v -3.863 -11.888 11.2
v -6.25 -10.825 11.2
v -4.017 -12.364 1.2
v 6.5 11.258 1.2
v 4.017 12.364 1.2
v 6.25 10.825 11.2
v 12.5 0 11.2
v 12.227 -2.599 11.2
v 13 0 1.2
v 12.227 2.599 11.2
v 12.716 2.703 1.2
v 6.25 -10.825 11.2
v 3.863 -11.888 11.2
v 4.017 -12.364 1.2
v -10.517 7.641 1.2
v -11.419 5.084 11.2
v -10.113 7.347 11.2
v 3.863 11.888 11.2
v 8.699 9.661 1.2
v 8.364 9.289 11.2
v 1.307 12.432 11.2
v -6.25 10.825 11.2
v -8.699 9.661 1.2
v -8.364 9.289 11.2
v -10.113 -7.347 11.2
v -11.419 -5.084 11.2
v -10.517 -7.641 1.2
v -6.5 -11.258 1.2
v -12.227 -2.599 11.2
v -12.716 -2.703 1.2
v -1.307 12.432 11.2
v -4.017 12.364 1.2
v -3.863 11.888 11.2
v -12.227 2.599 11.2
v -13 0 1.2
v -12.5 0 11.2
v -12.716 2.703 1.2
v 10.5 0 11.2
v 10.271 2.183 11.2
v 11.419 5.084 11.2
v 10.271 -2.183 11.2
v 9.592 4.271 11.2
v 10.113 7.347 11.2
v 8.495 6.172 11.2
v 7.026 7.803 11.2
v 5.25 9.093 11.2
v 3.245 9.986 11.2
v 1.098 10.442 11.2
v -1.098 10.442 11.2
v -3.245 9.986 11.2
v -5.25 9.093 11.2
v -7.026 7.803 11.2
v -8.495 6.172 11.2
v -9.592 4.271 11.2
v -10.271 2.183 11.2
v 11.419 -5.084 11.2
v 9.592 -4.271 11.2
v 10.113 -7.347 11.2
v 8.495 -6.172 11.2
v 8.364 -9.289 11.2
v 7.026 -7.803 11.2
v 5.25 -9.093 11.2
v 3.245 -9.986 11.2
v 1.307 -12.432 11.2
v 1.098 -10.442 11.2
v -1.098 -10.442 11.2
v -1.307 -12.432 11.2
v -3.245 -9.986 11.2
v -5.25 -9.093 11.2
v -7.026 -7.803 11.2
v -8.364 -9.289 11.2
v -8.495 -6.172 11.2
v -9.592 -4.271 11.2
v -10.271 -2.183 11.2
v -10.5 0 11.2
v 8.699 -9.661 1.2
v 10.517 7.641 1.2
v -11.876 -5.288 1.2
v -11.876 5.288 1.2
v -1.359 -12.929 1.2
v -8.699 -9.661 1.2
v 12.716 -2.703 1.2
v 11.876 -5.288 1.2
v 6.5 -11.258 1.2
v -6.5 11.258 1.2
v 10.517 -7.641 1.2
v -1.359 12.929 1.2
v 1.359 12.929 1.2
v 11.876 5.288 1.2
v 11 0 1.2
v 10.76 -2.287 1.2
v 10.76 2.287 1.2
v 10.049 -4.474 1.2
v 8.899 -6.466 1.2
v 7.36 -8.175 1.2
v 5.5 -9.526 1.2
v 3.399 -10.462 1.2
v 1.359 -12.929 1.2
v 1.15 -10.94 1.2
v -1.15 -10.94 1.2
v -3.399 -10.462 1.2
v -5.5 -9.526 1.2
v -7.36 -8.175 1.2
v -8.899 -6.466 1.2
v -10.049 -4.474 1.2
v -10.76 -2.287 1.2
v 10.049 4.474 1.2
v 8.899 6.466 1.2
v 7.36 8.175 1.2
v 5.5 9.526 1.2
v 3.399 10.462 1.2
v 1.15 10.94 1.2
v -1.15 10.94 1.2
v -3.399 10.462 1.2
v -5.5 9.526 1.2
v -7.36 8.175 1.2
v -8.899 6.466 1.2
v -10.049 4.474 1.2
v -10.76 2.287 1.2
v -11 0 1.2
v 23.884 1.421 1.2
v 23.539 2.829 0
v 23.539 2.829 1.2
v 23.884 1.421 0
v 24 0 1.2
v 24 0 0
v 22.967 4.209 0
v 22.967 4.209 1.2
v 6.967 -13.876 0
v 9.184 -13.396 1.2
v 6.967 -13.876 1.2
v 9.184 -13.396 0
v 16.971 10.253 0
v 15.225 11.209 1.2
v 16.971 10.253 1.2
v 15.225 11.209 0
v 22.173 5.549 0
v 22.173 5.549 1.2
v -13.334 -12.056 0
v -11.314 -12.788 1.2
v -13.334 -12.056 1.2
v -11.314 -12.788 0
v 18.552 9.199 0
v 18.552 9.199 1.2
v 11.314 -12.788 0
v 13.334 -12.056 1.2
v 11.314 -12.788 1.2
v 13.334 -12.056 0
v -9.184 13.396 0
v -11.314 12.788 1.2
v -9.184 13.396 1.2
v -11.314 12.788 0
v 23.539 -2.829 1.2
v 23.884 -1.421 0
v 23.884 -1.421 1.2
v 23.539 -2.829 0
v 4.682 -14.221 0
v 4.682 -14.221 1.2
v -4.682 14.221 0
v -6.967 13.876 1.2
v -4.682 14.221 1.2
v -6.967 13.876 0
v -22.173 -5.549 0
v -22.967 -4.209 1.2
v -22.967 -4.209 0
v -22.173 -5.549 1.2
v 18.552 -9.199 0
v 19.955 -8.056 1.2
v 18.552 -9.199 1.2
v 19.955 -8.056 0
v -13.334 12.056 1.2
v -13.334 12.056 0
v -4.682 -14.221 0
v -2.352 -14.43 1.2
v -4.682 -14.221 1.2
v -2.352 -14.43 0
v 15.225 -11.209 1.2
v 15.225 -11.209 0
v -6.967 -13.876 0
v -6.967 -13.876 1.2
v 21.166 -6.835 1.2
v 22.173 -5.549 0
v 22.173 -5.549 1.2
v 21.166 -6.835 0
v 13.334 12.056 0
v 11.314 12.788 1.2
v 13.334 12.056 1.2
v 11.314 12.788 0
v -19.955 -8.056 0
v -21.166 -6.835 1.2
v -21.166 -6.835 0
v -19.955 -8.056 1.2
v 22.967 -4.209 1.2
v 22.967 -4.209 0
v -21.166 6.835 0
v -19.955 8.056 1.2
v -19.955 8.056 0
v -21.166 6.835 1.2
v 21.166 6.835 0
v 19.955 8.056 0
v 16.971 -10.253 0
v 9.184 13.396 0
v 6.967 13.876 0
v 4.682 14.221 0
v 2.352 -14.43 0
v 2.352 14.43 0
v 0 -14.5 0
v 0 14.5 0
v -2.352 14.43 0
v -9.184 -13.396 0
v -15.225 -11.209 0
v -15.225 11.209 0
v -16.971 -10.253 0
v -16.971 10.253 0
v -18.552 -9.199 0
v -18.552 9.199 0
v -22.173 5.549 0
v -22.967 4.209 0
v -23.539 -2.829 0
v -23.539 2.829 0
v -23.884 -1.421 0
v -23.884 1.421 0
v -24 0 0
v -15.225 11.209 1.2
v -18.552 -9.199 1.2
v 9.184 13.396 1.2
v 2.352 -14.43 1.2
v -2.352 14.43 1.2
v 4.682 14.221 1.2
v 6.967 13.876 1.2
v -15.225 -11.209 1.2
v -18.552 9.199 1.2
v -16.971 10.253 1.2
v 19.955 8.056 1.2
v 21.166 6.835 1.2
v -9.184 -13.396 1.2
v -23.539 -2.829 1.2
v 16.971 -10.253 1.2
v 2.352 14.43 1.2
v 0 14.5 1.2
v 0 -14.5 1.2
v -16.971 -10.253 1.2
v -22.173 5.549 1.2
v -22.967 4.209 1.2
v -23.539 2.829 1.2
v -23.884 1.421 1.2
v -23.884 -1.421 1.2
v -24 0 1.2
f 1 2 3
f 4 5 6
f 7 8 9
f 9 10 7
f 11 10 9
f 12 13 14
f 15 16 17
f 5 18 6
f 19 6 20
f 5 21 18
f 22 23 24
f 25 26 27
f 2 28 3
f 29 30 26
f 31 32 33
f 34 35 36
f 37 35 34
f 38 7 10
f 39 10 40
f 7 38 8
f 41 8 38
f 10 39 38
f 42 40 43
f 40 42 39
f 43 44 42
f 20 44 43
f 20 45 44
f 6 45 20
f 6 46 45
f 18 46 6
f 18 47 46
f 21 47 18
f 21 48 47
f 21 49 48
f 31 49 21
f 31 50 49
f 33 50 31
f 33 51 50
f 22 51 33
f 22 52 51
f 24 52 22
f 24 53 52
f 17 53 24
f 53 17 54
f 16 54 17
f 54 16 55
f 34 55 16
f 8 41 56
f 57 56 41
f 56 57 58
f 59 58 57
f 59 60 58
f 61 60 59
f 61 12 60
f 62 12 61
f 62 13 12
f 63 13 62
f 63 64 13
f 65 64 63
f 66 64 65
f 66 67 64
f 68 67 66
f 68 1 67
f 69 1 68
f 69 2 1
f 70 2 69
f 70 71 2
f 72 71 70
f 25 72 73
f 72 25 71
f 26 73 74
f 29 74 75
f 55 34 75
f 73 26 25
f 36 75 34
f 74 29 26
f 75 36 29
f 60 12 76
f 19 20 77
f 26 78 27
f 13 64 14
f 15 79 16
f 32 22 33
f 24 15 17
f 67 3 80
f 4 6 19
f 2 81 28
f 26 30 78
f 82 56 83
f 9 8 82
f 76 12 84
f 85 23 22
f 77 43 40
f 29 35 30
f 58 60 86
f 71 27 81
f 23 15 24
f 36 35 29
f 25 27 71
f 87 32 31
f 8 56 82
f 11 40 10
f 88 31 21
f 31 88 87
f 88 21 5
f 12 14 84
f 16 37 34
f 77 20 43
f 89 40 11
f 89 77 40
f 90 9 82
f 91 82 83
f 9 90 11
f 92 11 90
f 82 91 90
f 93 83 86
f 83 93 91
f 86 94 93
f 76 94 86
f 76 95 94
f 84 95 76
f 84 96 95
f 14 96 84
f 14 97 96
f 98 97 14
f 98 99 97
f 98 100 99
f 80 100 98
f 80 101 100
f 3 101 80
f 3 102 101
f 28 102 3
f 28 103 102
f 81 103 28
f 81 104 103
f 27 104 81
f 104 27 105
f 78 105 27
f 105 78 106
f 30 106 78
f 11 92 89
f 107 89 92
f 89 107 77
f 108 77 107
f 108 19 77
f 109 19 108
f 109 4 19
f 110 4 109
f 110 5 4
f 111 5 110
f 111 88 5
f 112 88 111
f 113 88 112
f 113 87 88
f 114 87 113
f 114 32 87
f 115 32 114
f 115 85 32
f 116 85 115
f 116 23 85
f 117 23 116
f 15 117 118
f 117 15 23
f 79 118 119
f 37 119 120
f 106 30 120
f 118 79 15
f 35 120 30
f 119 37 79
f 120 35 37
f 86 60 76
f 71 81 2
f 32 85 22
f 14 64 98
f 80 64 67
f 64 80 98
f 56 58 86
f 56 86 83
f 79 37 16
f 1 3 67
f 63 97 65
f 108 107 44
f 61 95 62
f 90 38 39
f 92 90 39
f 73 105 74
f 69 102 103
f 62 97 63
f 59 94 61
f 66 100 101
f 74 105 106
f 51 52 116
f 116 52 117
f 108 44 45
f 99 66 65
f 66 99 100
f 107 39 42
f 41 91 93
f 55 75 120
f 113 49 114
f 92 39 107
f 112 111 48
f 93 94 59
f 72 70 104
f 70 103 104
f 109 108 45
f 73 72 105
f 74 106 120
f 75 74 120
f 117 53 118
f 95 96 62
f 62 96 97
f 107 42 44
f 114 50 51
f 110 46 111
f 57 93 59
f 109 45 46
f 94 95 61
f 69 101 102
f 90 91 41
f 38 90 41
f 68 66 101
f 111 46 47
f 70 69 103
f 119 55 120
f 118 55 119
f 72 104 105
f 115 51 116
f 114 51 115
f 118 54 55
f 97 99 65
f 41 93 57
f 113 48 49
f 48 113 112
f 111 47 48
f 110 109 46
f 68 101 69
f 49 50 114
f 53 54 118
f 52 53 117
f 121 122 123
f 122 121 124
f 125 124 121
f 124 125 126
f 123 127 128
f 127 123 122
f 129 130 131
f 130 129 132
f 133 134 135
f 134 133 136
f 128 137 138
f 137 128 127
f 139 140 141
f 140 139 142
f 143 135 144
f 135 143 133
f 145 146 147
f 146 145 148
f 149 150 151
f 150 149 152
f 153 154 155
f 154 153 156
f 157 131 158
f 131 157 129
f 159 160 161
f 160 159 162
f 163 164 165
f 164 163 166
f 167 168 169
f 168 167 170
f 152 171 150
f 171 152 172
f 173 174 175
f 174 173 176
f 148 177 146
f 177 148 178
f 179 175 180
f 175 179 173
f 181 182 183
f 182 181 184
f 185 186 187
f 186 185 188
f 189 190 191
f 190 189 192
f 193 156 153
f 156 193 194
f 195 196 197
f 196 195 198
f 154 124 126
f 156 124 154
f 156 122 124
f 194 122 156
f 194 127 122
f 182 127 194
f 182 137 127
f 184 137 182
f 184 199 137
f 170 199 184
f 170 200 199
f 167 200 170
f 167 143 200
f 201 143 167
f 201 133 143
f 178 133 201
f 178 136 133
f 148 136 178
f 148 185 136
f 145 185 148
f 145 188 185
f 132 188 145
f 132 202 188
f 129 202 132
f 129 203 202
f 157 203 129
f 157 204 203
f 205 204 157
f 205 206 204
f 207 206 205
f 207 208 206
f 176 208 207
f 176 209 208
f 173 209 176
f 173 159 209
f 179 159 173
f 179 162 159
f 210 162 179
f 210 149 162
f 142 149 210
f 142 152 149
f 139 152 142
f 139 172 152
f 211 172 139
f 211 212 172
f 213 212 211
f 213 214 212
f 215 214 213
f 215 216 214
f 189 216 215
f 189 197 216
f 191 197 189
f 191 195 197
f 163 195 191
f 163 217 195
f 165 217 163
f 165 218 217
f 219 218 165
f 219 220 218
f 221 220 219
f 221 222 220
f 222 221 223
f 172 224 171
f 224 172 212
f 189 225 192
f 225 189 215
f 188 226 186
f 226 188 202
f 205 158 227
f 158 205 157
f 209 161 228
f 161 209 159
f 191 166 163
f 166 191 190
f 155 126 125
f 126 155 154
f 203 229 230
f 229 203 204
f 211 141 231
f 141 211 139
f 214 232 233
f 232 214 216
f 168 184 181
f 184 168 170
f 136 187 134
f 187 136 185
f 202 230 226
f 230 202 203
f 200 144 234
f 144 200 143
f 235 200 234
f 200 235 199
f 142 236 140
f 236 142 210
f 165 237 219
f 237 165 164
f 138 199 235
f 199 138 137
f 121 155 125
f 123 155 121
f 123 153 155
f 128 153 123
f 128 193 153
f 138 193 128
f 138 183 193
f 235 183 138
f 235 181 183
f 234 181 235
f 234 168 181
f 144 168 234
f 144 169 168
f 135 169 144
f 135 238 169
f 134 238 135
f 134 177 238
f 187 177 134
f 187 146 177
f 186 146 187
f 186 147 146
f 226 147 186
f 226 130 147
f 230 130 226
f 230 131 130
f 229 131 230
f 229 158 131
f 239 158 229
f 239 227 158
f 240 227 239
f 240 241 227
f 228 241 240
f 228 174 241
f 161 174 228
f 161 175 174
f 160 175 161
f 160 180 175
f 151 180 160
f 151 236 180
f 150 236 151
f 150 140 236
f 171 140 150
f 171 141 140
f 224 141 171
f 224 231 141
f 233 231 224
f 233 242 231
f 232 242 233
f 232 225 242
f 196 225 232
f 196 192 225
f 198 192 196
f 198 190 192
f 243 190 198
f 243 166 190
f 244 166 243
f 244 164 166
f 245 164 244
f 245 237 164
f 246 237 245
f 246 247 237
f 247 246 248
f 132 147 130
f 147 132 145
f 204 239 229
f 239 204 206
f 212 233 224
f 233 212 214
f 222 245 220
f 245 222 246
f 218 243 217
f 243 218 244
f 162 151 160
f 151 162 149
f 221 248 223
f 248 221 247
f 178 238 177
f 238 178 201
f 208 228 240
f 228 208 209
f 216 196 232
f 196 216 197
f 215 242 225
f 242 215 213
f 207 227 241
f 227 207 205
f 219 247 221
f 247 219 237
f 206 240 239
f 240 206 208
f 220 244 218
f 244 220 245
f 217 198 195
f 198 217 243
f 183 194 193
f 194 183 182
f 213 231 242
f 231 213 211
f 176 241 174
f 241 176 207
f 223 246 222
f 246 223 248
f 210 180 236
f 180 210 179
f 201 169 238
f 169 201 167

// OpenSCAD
oval_dia_major=48;
oval_dia_minor=29;
oval_d=1.2;
plug_dia=26;
plug_d=10;

scale([1,oval_dia_minor/oval_dia_major, 1])
  cylinder(r=oval_dia_major/2,h=oval_d,$fn=64);

translate([0,0,oval_d]) {
  difference() {
    cylinder(r1=plug_dia/2,r2=plug_dia/2-0.5,h=plug_d);

    cylinder(r1=plug_dia/2-2,r2=plug_dia/2-0.5-2,h=plug_d);
  }
}
